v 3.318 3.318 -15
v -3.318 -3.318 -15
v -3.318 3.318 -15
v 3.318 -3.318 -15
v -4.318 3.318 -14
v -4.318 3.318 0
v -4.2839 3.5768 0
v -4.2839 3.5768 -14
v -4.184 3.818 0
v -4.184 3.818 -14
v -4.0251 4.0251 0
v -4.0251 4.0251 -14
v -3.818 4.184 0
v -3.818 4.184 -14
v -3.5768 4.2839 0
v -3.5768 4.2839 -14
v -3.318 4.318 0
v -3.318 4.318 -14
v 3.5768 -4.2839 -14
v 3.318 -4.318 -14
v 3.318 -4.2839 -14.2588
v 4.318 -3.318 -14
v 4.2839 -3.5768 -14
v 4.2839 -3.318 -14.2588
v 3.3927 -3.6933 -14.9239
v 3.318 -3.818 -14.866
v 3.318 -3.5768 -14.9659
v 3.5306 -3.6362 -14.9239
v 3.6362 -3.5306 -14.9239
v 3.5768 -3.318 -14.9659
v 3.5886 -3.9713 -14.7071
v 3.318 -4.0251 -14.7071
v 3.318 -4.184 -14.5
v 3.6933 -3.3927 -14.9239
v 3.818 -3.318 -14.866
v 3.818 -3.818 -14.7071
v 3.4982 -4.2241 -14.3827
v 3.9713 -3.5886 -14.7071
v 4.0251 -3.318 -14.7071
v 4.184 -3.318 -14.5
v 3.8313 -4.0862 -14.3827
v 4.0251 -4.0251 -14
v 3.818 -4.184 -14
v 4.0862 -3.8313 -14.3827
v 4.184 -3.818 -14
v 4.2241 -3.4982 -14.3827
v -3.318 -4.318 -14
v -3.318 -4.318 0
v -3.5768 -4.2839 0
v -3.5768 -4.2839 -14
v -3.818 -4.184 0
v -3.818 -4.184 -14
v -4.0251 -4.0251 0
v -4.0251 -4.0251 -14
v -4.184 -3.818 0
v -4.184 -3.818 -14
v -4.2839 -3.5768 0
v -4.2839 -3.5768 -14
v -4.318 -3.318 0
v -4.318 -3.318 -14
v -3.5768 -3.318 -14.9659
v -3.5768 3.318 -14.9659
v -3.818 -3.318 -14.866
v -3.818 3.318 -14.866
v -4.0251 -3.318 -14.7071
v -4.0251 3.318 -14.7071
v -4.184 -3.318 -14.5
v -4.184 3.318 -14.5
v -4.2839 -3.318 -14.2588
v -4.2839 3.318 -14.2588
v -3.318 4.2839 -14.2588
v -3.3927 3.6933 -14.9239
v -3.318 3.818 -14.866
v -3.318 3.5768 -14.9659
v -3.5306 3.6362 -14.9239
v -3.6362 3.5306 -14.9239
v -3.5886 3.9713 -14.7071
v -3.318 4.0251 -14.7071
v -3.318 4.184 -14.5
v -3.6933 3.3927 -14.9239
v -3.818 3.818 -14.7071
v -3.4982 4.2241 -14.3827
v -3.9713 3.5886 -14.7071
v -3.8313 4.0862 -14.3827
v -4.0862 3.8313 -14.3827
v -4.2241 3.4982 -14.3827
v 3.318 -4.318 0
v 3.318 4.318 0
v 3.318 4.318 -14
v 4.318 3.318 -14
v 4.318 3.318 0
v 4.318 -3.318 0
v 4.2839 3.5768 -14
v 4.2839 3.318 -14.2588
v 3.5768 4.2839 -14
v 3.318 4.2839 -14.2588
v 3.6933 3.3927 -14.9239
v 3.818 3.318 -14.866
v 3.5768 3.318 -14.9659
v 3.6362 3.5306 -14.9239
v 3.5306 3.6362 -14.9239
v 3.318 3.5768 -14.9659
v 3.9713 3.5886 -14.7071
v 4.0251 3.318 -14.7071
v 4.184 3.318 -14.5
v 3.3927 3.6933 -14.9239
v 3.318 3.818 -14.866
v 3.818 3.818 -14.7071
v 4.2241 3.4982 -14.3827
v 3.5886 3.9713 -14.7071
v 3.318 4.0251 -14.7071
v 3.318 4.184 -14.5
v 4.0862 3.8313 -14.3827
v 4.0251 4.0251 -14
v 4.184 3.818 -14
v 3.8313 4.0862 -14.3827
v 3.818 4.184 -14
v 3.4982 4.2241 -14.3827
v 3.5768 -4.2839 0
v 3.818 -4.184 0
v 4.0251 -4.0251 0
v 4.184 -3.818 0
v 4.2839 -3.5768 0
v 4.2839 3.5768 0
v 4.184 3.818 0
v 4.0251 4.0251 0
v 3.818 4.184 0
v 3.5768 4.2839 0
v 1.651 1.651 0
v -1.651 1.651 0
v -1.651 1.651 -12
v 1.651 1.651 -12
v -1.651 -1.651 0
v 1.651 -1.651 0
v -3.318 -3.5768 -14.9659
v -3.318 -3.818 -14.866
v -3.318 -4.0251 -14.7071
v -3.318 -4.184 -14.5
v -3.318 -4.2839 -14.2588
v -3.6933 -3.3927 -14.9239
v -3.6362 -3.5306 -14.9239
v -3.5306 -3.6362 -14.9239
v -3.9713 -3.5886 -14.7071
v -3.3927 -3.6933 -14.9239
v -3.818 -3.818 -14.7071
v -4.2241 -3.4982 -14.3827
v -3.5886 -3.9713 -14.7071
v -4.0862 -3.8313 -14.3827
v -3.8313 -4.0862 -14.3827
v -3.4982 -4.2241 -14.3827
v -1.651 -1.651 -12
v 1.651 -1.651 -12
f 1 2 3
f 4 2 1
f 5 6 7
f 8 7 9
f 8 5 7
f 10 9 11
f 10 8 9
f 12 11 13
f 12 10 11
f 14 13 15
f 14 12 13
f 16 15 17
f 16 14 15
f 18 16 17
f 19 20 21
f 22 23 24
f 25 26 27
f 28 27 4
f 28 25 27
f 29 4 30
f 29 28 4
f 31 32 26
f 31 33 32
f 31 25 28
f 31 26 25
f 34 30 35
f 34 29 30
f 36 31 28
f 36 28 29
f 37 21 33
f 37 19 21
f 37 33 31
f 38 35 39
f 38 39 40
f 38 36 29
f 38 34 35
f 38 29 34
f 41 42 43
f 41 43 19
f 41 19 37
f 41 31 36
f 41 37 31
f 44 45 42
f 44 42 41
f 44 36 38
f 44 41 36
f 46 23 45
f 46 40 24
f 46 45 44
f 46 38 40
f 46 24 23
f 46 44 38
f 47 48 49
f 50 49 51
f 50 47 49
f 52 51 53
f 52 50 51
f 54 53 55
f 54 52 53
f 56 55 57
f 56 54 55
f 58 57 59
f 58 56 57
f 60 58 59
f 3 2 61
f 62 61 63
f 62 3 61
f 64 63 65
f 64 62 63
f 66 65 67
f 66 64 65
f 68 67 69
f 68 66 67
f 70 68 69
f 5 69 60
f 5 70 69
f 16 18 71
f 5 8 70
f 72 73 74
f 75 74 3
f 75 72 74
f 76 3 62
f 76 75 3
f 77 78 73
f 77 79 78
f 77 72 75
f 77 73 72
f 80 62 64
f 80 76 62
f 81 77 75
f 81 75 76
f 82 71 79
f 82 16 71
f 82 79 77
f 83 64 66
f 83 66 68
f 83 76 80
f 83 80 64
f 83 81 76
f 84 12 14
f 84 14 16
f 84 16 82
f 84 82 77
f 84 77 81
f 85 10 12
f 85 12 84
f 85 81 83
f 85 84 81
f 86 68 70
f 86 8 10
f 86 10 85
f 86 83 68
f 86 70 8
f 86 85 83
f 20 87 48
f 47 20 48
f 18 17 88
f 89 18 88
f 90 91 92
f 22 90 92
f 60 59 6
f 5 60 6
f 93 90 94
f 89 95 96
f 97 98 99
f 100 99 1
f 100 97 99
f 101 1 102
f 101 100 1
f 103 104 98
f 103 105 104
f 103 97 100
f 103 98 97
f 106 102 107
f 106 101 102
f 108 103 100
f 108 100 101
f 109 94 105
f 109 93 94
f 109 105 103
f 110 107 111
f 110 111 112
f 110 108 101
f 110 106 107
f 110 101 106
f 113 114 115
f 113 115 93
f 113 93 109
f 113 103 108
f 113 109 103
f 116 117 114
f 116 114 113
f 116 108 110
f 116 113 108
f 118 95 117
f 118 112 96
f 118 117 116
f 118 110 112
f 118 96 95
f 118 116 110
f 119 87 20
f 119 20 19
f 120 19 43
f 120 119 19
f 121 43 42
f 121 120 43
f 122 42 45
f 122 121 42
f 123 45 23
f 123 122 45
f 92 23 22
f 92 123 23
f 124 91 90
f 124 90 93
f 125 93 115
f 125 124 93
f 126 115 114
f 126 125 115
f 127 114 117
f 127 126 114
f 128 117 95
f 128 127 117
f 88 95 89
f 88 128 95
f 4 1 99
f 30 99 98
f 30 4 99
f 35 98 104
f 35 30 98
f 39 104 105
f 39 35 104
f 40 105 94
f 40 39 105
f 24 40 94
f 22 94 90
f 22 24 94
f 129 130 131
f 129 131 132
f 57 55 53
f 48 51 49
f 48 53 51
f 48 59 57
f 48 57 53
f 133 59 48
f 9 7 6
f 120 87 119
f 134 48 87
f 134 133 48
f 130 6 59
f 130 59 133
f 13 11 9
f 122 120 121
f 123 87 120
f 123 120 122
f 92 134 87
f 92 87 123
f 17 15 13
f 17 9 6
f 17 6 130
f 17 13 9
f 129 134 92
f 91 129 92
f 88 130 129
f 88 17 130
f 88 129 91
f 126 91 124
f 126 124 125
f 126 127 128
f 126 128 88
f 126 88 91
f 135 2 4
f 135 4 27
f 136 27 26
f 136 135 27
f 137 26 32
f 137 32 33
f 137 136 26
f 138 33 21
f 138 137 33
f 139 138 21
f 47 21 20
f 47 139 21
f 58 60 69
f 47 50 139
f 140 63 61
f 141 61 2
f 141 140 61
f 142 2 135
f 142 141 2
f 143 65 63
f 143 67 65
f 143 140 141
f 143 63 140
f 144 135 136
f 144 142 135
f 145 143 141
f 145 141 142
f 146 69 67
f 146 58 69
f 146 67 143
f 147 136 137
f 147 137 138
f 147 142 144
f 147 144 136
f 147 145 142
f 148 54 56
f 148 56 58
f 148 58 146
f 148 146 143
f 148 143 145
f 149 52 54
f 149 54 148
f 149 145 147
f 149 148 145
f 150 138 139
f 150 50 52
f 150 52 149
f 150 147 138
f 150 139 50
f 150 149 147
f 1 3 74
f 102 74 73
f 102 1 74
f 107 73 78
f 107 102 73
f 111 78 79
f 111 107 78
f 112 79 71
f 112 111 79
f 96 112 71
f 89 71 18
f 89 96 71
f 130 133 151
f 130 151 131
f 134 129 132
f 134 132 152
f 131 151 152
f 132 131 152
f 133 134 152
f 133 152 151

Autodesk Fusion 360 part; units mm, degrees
sketch "Sketch1" plane through (0, 0, 0) normal (0, 0, 1) x (1, 0, 0)
  line L0 (1.651, -1.651) -> (-1.651, -1.651)
  line L1 (-1.651, -1.651) -> (-1.651, 1.651)
  line L2 (-1.651, 1.651) -> (1.651, 1.651)
  line L3 (1.651, 1.651) -> (1.651, -1.651)
  line L4 (1.651, -1.651) -> (-1.651, 1.651) construction
  line L5 (-1.651, -1.651) -> (1.651, 1.651) construction
  line L6 (4.318, -4.318) -> (-4.318, -4.318)
  line L7 (-4.318, -4.318) -> (-4.318, 4.318)
  line L8 (-4.318, 4.318) -> (4.318, 4.318)
  line L9 (4.318, 4.318) -> (4.318, -4.318)
  line L10 (4.318, -4.318) -> (-4.318, 4.318) construction
  line L11 (-4.318, -4.318) -> (4.318, 4.318) construction
  dimension "d1" = 3.302
extrude "Extrude1" add sketch "Sketch1" against normal blind 12
sketch "Sketch2" plane through (0, 0, -12) normal (0, 0, -1) x (1, 0, 0)
  line L0 (1.651, -1.651) -> (-1.651, -1.651)
  line L1 (-1.651, -1.651) -> (-1.651, 1.651)
  line L2 (-1.651, 1.651) -> (1.651, 1.651)
  line L3 (1.651, 1.651) -> (1.651, -1.651)
  line L4 (-4.318, -4.318) -> (4.318, -4.318)
  line L5 (4.318, -4.318) -> (4.318, 4.318)
  line L6 (4.318, 4.318) -> (-4.318, 4.318)
  line L7 (-4.318, 4.318) -> (-4.318, -4.318)
  line L8 (-4.318, 4.318) -> (4.318, 4.318)
  line L9 (4.318, 4.318) -> (4.318, -4.318)
  line L10 (4.318, -4.318) -> (-4.318, -4.318)
  line L11 (-4.318, -4.318) -> (-4.318, 4.318)
extrude "Extrude2" add sketch "Sketch2" along normal blind 3 contours L0 L1 L2 L3 | L4 L5 L6 L7 L8 L9 L10 L11
fillet "Fillet1" radius 1 4 edges at (-4.318, 4.318, -7.5) (4.318, 4.318, -7.5) (4.318, -4.318, -7.5) (-4.318, -4.318, -7.5)
fillet "Fillet2" radius 1 8 edges at (-4.0251, -4.0251, -15) (-4.318, 0, -15) (-4.0251, 4.0251, -15) (0, 4.318, -15) (4.0251, 4.0251, -15) (4.318, 0, -15) (4.0251, -4.0251, -15) (0, -4.318, -15)
